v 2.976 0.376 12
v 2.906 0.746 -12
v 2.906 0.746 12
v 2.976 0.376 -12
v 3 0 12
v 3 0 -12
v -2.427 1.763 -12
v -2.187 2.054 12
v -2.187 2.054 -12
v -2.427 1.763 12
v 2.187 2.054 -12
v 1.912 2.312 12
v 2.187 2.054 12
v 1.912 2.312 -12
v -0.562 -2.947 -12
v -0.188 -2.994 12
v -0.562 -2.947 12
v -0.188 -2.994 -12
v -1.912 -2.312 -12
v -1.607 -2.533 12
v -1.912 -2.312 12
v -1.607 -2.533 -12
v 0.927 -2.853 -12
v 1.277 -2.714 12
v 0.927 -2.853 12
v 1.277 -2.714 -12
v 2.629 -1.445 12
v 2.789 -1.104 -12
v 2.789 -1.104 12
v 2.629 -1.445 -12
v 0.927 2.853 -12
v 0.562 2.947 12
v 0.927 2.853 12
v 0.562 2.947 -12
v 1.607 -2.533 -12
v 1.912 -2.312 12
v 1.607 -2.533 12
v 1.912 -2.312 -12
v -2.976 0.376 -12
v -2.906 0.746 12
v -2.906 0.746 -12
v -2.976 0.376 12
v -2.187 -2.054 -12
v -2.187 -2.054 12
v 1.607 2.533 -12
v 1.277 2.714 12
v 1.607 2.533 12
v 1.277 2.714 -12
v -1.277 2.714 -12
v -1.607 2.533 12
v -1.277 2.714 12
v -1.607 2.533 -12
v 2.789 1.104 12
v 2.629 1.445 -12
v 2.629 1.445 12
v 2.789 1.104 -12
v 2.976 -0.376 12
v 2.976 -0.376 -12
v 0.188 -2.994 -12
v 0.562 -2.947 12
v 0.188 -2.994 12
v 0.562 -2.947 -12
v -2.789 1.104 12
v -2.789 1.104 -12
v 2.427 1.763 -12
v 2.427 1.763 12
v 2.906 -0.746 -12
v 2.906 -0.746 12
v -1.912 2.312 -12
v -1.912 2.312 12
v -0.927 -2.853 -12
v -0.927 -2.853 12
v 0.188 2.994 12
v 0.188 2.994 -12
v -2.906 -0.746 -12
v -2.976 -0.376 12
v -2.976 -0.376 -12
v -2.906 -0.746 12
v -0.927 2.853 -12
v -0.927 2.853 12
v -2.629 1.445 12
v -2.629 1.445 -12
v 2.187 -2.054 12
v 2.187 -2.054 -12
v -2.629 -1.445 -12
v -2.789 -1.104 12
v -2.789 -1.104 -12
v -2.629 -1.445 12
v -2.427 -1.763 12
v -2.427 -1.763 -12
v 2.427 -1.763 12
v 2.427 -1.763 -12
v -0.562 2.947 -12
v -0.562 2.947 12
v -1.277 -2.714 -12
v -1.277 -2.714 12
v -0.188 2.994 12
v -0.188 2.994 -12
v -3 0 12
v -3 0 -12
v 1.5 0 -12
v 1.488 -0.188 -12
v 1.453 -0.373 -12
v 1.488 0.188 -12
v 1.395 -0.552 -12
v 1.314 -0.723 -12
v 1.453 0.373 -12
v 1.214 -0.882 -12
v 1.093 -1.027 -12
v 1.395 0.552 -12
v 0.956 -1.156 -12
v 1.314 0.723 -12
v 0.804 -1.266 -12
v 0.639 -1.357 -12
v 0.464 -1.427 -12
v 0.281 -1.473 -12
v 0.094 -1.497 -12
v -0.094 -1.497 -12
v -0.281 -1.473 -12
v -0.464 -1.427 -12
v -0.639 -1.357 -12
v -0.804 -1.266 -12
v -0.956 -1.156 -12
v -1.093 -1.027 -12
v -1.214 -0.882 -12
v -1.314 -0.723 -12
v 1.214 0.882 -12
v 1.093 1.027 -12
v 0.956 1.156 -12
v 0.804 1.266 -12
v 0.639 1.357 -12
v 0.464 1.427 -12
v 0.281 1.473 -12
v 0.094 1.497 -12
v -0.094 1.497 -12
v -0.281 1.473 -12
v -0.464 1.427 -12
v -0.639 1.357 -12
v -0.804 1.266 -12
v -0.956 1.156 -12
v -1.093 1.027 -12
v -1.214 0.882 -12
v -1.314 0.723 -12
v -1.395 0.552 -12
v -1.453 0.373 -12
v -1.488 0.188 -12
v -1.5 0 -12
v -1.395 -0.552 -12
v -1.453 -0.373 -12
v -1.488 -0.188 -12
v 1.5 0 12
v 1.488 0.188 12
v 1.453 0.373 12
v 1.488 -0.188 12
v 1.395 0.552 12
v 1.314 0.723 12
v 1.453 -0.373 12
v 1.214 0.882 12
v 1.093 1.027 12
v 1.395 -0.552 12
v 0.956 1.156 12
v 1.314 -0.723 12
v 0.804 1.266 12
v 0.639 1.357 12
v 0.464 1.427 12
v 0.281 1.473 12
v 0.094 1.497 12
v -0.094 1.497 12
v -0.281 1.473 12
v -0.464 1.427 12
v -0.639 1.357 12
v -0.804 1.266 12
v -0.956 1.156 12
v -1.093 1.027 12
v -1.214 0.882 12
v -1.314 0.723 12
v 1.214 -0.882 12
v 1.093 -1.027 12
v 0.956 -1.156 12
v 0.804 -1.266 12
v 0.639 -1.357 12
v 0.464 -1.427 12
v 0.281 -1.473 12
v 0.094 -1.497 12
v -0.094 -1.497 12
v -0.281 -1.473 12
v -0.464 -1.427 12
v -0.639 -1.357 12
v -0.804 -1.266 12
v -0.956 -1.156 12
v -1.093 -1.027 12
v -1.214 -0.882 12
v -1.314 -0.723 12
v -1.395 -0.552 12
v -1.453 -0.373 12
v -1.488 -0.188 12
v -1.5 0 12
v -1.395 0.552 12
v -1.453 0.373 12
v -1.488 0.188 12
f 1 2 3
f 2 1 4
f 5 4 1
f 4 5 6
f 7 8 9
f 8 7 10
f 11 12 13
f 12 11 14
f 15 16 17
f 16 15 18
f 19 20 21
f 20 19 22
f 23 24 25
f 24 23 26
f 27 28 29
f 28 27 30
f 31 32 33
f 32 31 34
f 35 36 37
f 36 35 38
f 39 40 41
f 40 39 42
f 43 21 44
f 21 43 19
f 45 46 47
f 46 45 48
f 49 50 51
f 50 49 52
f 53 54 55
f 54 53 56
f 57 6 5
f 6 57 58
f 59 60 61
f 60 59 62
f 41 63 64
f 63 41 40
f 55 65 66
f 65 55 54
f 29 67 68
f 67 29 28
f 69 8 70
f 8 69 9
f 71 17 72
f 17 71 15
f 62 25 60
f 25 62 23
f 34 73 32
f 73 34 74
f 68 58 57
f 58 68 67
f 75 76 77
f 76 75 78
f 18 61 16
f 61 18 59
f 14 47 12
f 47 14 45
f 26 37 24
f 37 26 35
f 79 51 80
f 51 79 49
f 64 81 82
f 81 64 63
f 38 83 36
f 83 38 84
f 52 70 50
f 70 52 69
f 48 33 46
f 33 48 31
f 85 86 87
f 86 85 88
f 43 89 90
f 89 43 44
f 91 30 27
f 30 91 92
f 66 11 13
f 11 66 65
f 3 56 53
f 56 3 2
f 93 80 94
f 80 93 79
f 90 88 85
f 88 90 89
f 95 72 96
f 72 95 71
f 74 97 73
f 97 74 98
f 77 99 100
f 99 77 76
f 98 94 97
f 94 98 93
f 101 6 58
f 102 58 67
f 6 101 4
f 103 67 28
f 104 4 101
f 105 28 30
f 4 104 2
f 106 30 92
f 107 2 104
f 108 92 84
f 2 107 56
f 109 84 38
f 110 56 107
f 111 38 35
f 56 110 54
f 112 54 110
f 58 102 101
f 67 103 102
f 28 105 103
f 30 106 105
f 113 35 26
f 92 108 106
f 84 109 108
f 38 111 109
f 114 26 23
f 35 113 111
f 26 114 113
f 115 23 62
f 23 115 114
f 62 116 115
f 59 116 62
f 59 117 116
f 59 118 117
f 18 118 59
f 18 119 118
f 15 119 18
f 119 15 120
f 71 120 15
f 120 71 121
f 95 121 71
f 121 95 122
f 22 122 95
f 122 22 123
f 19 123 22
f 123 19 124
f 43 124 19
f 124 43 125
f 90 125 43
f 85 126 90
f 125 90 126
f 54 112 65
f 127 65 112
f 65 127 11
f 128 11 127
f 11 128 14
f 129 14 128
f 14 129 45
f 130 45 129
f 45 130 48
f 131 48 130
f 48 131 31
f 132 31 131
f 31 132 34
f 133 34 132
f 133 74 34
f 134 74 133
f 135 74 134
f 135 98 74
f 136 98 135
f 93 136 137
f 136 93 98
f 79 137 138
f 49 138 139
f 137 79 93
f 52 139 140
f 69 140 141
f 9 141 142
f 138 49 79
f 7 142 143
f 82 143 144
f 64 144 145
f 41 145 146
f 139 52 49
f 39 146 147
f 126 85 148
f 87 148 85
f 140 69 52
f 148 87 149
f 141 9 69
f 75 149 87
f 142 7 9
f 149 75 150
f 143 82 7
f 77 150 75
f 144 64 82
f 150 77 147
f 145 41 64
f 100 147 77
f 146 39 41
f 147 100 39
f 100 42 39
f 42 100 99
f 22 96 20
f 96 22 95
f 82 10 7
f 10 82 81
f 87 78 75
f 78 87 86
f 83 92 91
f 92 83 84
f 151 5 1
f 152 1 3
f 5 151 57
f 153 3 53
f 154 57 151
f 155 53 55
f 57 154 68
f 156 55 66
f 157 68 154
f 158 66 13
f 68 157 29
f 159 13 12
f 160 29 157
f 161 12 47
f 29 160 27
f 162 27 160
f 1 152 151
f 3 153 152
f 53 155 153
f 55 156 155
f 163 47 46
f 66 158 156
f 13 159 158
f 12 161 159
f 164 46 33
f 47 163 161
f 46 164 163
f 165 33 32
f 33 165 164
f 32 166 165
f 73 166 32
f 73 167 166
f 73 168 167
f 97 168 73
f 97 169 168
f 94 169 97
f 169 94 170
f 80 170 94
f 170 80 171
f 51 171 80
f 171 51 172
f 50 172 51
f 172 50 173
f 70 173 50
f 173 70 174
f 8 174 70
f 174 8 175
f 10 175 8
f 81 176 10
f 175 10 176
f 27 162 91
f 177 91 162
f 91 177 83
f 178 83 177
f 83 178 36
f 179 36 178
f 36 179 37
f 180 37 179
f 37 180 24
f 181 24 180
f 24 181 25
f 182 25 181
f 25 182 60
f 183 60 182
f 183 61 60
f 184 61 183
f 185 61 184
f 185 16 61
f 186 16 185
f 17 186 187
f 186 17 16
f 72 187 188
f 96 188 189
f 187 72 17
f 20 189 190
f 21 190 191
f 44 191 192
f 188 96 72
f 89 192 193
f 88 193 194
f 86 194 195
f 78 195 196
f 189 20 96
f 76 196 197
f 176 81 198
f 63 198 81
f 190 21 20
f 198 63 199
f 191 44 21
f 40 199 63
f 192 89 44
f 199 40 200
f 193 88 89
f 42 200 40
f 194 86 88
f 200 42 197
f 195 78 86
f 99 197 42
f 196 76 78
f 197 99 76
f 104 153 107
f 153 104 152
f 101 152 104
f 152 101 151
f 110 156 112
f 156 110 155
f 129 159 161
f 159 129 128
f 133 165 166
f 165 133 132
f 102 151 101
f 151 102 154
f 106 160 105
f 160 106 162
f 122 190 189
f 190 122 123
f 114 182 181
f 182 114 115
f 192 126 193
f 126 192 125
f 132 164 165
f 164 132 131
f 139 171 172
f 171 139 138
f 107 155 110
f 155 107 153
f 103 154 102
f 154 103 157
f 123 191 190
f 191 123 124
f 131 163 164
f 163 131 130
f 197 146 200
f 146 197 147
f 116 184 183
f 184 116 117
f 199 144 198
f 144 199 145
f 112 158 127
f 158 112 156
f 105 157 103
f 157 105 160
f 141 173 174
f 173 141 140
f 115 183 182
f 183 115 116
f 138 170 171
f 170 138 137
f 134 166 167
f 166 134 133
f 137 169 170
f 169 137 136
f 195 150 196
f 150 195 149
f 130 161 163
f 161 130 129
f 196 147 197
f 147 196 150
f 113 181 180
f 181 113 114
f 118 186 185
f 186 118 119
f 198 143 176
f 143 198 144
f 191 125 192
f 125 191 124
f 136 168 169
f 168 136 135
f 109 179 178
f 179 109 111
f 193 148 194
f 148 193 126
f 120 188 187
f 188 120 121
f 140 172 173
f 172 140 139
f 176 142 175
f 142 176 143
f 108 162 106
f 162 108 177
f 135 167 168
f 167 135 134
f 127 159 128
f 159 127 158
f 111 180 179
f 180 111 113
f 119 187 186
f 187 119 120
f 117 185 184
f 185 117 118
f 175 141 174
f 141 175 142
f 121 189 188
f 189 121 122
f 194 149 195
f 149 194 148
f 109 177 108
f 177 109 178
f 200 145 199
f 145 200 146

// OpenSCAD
$fn = 50;


difference() {
	union() {
		translate(v = [0, 0, -12.0000000000]) {
			cylinder(h = 24, r = 3.0000000000);
		}
	}
	union() {
		translate(v = [0, 0, -100.0000000000]) {
			cylinder(h = 200, r = 1.5000000000);
		}
	}
}
